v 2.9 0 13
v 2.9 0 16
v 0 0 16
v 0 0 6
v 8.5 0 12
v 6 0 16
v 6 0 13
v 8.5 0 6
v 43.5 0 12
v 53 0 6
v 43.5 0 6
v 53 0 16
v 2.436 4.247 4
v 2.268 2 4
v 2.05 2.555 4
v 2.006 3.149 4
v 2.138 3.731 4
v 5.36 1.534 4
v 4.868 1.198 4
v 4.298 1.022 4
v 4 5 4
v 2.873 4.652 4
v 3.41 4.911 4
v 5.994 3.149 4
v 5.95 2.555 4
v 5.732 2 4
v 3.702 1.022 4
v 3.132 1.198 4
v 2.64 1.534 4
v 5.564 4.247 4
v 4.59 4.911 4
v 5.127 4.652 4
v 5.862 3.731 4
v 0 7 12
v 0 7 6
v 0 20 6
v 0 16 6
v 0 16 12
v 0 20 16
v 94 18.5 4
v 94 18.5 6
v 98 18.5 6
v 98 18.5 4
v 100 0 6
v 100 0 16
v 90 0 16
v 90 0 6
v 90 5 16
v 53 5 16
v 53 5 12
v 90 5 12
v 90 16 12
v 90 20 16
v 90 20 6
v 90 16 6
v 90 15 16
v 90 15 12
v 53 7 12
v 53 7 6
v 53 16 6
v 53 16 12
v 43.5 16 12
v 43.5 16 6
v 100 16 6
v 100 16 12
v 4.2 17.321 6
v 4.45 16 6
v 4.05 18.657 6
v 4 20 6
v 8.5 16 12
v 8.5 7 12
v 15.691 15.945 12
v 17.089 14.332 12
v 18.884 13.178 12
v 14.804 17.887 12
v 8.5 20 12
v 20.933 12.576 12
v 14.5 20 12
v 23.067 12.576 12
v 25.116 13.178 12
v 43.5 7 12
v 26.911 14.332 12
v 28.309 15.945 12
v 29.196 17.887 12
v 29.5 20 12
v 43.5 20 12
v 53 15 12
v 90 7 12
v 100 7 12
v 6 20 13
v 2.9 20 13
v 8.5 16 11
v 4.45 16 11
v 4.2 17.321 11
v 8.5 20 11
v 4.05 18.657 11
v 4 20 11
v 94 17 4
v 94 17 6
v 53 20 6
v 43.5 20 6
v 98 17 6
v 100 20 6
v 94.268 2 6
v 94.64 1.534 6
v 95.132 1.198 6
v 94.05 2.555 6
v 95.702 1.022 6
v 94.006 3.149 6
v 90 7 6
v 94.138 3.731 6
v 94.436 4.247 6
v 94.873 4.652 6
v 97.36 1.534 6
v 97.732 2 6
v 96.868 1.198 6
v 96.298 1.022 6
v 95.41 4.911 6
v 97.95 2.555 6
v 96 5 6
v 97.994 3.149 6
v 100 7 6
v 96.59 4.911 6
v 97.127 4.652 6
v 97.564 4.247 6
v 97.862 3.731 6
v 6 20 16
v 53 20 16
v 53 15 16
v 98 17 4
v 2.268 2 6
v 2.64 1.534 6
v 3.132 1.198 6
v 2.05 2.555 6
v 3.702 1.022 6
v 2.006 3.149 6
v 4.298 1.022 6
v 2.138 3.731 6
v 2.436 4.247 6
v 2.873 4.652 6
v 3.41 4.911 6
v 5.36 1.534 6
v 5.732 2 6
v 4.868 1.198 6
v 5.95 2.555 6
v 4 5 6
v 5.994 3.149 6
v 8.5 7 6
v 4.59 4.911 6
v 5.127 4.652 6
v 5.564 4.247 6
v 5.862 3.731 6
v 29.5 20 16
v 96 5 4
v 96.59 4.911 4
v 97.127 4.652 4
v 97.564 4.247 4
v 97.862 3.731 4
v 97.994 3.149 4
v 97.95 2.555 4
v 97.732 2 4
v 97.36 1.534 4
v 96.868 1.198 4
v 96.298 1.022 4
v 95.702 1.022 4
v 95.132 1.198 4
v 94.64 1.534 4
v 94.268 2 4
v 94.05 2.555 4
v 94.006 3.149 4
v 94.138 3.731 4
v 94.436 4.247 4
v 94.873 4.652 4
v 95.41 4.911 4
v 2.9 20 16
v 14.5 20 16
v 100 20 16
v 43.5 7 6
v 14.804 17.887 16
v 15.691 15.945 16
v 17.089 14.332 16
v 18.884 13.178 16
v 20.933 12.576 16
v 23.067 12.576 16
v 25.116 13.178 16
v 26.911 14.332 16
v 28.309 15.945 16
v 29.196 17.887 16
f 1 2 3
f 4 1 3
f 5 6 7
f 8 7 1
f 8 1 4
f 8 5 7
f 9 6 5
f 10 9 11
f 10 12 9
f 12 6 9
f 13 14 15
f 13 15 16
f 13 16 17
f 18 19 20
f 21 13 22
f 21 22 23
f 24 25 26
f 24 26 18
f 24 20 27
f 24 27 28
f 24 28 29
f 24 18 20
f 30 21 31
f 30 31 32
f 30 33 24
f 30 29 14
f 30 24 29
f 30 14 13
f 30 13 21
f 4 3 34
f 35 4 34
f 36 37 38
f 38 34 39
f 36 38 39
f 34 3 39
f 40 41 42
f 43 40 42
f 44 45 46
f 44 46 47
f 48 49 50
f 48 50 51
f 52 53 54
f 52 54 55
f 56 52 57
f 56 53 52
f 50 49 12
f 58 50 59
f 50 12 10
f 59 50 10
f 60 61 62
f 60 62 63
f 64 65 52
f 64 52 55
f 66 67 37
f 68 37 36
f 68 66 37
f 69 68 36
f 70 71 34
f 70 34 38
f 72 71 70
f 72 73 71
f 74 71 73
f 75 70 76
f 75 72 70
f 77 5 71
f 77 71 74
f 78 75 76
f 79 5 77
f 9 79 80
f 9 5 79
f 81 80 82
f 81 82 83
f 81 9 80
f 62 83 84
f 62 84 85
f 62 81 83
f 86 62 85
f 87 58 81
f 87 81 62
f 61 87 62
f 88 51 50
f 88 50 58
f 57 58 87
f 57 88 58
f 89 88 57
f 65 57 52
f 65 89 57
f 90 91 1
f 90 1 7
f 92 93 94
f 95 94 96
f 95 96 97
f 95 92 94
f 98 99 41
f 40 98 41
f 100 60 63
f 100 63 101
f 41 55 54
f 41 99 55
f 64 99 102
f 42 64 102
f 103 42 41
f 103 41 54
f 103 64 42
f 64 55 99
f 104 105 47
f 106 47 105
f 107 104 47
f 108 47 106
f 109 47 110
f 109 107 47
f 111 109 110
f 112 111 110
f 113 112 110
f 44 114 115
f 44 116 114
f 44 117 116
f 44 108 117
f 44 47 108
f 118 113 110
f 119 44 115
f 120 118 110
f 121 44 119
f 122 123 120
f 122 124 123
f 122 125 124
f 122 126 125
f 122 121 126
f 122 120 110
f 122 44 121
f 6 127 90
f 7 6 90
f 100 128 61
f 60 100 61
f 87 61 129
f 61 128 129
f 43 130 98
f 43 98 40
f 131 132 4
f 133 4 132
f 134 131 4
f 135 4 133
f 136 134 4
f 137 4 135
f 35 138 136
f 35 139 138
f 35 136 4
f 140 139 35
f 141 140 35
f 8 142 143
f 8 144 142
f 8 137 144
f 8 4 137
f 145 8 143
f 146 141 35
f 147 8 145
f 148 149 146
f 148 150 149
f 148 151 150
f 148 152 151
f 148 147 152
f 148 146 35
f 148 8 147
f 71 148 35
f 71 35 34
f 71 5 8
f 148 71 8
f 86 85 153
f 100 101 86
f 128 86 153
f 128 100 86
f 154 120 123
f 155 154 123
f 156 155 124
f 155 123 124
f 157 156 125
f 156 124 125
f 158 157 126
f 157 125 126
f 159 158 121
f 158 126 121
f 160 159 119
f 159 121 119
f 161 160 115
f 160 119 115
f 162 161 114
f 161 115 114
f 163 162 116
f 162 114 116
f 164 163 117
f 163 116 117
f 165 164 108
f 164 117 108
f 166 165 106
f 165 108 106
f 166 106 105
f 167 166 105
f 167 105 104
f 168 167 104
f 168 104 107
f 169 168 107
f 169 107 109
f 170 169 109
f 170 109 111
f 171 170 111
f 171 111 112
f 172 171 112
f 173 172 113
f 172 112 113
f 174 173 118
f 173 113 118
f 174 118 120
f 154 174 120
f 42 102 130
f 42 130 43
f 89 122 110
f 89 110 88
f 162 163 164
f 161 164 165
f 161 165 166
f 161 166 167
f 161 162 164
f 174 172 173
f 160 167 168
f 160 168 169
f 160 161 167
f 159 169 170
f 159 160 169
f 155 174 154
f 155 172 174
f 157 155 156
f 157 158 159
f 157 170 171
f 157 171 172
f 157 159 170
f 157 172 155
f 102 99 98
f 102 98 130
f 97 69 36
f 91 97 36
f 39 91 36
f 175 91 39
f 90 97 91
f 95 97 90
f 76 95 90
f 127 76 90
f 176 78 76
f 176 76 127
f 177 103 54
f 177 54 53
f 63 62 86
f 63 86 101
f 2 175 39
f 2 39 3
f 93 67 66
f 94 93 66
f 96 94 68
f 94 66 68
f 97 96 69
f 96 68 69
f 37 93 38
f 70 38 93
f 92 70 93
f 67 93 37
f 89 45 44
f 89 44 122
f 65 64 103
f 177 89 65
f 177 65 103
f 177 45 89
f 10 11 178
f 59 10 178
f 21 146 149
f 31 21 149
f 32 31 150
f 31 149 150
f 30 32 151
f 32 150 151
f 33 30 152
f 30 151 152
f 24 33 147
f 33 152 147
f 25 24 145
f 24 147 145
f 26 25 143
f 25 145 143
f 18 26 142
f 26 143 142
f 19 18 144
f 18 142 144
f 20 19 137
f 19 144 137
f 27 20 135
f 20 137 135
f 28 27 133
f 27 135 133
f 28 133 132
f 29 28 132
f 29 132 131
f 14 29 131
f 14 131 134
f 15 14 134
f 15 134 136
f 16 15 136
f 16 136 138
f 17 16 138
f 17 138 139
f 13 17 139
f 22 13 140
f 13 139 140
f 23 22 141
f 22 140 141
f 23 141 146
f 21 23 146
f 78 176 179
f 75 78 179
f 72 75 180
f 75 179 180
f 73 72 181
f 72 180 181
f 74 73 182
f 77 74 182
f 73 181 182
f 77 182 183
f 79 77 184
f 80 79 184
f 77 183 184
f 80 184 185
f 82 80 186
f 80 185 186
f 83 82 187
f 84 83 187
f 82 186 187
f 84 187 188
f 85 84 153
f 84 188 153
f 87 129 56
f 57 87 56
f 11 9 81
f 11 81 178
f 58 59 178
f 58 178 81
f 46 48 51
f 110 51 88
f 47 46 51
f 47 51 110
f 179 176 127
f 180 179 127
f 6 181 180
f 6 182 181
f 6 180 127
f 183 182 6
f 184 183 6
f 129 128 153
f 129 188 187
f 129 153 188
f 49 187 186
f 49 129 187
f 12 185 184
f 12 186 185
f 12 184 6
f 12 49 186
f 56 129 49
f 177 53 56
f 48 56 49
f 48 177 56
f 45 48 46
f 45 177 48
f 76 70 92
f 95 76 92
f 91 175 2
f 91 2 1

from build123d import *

# Parameters (mm, degrees)
PAD008_DEPTH    = 100
SKETCH013_R     = 2
SKETCH013_W     = 1.5
SKETCH013_H     = 4
PAD_DEPTH       = 2
SKETCH005_W     = 6
SKETCH005_H     = 37
SKETCH005_H_2   = 35
POCKET013_DEPTH = 20
SKETCH009_W     = 8
SKETCH009_H     = 3.1
POCKET014_DEPTH = 20
SKETCH007_W     = 5
SKETCH007_H     = 37
POCKET015_DEPTH = 5
SKETCH021_R     = 18
POCKET018_DEPTH = 5


with BuildPart() as part:
    # Sketch004 → Pad008 (new body)
    with BuildSketch(Plane.YZ.offset(100)):
        Polygon((7, 12), (16, 12), (16, 6), (20, 6), (20, 16), (0, 16), (0, 6), (7, 6), align=None)
    extrude(amount=-PAD008_DEPTH)

    # Sketch013 → Pad (new body)
    with BuildSketch(Plane(origin=(100, 0, 6), x_dir=(0, 1, 0), z_dir=(0, 0, -1))):
        with Locations((3, -4)):
            Circle(SKETCH013_R)
        with Locations((3, -96)):
            Circle(SKETCH013_R)
        with Locations((17.75, -4)):
            Rectangle(SKETCH013_W, SKETCH013_H)
    extrude(amount=PAD_DEPTH)

    # Sketch005 → Pocket013 (cut)
    with BuildSketch(Plane(origin=(100, 0, 0), x_dir=(0, 0, -1), z_dir=(0, -1, 0))):
        with Locations((-9, -28.5)):
            Rectangle(SKETCH005_W, SKETCH005_H)
        with Locations((-9, -74)):
            Rectangle(SKETCH005_W, SKETCH005_H_2)
    extrude(amount=-POCKET013_DEPTH, mode=Mode.SUBTRACT)

    # Sketch009 → Pocket014 (cut)
    with BuildSketch(Plane(origin=(100, 0, 0), x_dir=(0, 0, -1), z_dir=(0, -1, 0))):
        with Locations((-17, -95.55)):
            Rectangle(SKETCH009_W, SKETCH009_H)
    extrude(amount=-POCKET014_DEPTH, mode=Mode.SUBTRACT)

    # Sketch007 → Pocket015 (cut)
    with BuildSketch(Plane(origin=(100, 0, 16), x_dir=(0, -1, 0), z_dir=(0, 0, 1))):
        with BuildLine():
            ThreePointArc((-20, -85.5), (-12.499999, -78), (-20, -70.5))
            Line((-20, -85.5), (-20, -70.5))
        make_face()
        with Locations((-17.5, -28.5)):
            Rectangle(SKETCH007_W, SKETCH007_H)
        with Locations((-2.5, -28.5)):
            Rectangle(SKETCH007_W, SKETCH007_H)
    extrude(amount=-POCKET015_DEPTH, mode=Mode.SUBTRACT)

    # Sketch021 → Pocket018 (cut)
    with BuildSketch(Plane(origin=(100, 0, 6), x_dir=(0, 1, 0), z_dir=(0, 0, -1))):
        with Locations((20, -78)):
            Circle(SKETCH021_R)
    extrude(amount=-POCKET018_DEPTH, mode=Mode.SUBTRACT)


solid = part.part
